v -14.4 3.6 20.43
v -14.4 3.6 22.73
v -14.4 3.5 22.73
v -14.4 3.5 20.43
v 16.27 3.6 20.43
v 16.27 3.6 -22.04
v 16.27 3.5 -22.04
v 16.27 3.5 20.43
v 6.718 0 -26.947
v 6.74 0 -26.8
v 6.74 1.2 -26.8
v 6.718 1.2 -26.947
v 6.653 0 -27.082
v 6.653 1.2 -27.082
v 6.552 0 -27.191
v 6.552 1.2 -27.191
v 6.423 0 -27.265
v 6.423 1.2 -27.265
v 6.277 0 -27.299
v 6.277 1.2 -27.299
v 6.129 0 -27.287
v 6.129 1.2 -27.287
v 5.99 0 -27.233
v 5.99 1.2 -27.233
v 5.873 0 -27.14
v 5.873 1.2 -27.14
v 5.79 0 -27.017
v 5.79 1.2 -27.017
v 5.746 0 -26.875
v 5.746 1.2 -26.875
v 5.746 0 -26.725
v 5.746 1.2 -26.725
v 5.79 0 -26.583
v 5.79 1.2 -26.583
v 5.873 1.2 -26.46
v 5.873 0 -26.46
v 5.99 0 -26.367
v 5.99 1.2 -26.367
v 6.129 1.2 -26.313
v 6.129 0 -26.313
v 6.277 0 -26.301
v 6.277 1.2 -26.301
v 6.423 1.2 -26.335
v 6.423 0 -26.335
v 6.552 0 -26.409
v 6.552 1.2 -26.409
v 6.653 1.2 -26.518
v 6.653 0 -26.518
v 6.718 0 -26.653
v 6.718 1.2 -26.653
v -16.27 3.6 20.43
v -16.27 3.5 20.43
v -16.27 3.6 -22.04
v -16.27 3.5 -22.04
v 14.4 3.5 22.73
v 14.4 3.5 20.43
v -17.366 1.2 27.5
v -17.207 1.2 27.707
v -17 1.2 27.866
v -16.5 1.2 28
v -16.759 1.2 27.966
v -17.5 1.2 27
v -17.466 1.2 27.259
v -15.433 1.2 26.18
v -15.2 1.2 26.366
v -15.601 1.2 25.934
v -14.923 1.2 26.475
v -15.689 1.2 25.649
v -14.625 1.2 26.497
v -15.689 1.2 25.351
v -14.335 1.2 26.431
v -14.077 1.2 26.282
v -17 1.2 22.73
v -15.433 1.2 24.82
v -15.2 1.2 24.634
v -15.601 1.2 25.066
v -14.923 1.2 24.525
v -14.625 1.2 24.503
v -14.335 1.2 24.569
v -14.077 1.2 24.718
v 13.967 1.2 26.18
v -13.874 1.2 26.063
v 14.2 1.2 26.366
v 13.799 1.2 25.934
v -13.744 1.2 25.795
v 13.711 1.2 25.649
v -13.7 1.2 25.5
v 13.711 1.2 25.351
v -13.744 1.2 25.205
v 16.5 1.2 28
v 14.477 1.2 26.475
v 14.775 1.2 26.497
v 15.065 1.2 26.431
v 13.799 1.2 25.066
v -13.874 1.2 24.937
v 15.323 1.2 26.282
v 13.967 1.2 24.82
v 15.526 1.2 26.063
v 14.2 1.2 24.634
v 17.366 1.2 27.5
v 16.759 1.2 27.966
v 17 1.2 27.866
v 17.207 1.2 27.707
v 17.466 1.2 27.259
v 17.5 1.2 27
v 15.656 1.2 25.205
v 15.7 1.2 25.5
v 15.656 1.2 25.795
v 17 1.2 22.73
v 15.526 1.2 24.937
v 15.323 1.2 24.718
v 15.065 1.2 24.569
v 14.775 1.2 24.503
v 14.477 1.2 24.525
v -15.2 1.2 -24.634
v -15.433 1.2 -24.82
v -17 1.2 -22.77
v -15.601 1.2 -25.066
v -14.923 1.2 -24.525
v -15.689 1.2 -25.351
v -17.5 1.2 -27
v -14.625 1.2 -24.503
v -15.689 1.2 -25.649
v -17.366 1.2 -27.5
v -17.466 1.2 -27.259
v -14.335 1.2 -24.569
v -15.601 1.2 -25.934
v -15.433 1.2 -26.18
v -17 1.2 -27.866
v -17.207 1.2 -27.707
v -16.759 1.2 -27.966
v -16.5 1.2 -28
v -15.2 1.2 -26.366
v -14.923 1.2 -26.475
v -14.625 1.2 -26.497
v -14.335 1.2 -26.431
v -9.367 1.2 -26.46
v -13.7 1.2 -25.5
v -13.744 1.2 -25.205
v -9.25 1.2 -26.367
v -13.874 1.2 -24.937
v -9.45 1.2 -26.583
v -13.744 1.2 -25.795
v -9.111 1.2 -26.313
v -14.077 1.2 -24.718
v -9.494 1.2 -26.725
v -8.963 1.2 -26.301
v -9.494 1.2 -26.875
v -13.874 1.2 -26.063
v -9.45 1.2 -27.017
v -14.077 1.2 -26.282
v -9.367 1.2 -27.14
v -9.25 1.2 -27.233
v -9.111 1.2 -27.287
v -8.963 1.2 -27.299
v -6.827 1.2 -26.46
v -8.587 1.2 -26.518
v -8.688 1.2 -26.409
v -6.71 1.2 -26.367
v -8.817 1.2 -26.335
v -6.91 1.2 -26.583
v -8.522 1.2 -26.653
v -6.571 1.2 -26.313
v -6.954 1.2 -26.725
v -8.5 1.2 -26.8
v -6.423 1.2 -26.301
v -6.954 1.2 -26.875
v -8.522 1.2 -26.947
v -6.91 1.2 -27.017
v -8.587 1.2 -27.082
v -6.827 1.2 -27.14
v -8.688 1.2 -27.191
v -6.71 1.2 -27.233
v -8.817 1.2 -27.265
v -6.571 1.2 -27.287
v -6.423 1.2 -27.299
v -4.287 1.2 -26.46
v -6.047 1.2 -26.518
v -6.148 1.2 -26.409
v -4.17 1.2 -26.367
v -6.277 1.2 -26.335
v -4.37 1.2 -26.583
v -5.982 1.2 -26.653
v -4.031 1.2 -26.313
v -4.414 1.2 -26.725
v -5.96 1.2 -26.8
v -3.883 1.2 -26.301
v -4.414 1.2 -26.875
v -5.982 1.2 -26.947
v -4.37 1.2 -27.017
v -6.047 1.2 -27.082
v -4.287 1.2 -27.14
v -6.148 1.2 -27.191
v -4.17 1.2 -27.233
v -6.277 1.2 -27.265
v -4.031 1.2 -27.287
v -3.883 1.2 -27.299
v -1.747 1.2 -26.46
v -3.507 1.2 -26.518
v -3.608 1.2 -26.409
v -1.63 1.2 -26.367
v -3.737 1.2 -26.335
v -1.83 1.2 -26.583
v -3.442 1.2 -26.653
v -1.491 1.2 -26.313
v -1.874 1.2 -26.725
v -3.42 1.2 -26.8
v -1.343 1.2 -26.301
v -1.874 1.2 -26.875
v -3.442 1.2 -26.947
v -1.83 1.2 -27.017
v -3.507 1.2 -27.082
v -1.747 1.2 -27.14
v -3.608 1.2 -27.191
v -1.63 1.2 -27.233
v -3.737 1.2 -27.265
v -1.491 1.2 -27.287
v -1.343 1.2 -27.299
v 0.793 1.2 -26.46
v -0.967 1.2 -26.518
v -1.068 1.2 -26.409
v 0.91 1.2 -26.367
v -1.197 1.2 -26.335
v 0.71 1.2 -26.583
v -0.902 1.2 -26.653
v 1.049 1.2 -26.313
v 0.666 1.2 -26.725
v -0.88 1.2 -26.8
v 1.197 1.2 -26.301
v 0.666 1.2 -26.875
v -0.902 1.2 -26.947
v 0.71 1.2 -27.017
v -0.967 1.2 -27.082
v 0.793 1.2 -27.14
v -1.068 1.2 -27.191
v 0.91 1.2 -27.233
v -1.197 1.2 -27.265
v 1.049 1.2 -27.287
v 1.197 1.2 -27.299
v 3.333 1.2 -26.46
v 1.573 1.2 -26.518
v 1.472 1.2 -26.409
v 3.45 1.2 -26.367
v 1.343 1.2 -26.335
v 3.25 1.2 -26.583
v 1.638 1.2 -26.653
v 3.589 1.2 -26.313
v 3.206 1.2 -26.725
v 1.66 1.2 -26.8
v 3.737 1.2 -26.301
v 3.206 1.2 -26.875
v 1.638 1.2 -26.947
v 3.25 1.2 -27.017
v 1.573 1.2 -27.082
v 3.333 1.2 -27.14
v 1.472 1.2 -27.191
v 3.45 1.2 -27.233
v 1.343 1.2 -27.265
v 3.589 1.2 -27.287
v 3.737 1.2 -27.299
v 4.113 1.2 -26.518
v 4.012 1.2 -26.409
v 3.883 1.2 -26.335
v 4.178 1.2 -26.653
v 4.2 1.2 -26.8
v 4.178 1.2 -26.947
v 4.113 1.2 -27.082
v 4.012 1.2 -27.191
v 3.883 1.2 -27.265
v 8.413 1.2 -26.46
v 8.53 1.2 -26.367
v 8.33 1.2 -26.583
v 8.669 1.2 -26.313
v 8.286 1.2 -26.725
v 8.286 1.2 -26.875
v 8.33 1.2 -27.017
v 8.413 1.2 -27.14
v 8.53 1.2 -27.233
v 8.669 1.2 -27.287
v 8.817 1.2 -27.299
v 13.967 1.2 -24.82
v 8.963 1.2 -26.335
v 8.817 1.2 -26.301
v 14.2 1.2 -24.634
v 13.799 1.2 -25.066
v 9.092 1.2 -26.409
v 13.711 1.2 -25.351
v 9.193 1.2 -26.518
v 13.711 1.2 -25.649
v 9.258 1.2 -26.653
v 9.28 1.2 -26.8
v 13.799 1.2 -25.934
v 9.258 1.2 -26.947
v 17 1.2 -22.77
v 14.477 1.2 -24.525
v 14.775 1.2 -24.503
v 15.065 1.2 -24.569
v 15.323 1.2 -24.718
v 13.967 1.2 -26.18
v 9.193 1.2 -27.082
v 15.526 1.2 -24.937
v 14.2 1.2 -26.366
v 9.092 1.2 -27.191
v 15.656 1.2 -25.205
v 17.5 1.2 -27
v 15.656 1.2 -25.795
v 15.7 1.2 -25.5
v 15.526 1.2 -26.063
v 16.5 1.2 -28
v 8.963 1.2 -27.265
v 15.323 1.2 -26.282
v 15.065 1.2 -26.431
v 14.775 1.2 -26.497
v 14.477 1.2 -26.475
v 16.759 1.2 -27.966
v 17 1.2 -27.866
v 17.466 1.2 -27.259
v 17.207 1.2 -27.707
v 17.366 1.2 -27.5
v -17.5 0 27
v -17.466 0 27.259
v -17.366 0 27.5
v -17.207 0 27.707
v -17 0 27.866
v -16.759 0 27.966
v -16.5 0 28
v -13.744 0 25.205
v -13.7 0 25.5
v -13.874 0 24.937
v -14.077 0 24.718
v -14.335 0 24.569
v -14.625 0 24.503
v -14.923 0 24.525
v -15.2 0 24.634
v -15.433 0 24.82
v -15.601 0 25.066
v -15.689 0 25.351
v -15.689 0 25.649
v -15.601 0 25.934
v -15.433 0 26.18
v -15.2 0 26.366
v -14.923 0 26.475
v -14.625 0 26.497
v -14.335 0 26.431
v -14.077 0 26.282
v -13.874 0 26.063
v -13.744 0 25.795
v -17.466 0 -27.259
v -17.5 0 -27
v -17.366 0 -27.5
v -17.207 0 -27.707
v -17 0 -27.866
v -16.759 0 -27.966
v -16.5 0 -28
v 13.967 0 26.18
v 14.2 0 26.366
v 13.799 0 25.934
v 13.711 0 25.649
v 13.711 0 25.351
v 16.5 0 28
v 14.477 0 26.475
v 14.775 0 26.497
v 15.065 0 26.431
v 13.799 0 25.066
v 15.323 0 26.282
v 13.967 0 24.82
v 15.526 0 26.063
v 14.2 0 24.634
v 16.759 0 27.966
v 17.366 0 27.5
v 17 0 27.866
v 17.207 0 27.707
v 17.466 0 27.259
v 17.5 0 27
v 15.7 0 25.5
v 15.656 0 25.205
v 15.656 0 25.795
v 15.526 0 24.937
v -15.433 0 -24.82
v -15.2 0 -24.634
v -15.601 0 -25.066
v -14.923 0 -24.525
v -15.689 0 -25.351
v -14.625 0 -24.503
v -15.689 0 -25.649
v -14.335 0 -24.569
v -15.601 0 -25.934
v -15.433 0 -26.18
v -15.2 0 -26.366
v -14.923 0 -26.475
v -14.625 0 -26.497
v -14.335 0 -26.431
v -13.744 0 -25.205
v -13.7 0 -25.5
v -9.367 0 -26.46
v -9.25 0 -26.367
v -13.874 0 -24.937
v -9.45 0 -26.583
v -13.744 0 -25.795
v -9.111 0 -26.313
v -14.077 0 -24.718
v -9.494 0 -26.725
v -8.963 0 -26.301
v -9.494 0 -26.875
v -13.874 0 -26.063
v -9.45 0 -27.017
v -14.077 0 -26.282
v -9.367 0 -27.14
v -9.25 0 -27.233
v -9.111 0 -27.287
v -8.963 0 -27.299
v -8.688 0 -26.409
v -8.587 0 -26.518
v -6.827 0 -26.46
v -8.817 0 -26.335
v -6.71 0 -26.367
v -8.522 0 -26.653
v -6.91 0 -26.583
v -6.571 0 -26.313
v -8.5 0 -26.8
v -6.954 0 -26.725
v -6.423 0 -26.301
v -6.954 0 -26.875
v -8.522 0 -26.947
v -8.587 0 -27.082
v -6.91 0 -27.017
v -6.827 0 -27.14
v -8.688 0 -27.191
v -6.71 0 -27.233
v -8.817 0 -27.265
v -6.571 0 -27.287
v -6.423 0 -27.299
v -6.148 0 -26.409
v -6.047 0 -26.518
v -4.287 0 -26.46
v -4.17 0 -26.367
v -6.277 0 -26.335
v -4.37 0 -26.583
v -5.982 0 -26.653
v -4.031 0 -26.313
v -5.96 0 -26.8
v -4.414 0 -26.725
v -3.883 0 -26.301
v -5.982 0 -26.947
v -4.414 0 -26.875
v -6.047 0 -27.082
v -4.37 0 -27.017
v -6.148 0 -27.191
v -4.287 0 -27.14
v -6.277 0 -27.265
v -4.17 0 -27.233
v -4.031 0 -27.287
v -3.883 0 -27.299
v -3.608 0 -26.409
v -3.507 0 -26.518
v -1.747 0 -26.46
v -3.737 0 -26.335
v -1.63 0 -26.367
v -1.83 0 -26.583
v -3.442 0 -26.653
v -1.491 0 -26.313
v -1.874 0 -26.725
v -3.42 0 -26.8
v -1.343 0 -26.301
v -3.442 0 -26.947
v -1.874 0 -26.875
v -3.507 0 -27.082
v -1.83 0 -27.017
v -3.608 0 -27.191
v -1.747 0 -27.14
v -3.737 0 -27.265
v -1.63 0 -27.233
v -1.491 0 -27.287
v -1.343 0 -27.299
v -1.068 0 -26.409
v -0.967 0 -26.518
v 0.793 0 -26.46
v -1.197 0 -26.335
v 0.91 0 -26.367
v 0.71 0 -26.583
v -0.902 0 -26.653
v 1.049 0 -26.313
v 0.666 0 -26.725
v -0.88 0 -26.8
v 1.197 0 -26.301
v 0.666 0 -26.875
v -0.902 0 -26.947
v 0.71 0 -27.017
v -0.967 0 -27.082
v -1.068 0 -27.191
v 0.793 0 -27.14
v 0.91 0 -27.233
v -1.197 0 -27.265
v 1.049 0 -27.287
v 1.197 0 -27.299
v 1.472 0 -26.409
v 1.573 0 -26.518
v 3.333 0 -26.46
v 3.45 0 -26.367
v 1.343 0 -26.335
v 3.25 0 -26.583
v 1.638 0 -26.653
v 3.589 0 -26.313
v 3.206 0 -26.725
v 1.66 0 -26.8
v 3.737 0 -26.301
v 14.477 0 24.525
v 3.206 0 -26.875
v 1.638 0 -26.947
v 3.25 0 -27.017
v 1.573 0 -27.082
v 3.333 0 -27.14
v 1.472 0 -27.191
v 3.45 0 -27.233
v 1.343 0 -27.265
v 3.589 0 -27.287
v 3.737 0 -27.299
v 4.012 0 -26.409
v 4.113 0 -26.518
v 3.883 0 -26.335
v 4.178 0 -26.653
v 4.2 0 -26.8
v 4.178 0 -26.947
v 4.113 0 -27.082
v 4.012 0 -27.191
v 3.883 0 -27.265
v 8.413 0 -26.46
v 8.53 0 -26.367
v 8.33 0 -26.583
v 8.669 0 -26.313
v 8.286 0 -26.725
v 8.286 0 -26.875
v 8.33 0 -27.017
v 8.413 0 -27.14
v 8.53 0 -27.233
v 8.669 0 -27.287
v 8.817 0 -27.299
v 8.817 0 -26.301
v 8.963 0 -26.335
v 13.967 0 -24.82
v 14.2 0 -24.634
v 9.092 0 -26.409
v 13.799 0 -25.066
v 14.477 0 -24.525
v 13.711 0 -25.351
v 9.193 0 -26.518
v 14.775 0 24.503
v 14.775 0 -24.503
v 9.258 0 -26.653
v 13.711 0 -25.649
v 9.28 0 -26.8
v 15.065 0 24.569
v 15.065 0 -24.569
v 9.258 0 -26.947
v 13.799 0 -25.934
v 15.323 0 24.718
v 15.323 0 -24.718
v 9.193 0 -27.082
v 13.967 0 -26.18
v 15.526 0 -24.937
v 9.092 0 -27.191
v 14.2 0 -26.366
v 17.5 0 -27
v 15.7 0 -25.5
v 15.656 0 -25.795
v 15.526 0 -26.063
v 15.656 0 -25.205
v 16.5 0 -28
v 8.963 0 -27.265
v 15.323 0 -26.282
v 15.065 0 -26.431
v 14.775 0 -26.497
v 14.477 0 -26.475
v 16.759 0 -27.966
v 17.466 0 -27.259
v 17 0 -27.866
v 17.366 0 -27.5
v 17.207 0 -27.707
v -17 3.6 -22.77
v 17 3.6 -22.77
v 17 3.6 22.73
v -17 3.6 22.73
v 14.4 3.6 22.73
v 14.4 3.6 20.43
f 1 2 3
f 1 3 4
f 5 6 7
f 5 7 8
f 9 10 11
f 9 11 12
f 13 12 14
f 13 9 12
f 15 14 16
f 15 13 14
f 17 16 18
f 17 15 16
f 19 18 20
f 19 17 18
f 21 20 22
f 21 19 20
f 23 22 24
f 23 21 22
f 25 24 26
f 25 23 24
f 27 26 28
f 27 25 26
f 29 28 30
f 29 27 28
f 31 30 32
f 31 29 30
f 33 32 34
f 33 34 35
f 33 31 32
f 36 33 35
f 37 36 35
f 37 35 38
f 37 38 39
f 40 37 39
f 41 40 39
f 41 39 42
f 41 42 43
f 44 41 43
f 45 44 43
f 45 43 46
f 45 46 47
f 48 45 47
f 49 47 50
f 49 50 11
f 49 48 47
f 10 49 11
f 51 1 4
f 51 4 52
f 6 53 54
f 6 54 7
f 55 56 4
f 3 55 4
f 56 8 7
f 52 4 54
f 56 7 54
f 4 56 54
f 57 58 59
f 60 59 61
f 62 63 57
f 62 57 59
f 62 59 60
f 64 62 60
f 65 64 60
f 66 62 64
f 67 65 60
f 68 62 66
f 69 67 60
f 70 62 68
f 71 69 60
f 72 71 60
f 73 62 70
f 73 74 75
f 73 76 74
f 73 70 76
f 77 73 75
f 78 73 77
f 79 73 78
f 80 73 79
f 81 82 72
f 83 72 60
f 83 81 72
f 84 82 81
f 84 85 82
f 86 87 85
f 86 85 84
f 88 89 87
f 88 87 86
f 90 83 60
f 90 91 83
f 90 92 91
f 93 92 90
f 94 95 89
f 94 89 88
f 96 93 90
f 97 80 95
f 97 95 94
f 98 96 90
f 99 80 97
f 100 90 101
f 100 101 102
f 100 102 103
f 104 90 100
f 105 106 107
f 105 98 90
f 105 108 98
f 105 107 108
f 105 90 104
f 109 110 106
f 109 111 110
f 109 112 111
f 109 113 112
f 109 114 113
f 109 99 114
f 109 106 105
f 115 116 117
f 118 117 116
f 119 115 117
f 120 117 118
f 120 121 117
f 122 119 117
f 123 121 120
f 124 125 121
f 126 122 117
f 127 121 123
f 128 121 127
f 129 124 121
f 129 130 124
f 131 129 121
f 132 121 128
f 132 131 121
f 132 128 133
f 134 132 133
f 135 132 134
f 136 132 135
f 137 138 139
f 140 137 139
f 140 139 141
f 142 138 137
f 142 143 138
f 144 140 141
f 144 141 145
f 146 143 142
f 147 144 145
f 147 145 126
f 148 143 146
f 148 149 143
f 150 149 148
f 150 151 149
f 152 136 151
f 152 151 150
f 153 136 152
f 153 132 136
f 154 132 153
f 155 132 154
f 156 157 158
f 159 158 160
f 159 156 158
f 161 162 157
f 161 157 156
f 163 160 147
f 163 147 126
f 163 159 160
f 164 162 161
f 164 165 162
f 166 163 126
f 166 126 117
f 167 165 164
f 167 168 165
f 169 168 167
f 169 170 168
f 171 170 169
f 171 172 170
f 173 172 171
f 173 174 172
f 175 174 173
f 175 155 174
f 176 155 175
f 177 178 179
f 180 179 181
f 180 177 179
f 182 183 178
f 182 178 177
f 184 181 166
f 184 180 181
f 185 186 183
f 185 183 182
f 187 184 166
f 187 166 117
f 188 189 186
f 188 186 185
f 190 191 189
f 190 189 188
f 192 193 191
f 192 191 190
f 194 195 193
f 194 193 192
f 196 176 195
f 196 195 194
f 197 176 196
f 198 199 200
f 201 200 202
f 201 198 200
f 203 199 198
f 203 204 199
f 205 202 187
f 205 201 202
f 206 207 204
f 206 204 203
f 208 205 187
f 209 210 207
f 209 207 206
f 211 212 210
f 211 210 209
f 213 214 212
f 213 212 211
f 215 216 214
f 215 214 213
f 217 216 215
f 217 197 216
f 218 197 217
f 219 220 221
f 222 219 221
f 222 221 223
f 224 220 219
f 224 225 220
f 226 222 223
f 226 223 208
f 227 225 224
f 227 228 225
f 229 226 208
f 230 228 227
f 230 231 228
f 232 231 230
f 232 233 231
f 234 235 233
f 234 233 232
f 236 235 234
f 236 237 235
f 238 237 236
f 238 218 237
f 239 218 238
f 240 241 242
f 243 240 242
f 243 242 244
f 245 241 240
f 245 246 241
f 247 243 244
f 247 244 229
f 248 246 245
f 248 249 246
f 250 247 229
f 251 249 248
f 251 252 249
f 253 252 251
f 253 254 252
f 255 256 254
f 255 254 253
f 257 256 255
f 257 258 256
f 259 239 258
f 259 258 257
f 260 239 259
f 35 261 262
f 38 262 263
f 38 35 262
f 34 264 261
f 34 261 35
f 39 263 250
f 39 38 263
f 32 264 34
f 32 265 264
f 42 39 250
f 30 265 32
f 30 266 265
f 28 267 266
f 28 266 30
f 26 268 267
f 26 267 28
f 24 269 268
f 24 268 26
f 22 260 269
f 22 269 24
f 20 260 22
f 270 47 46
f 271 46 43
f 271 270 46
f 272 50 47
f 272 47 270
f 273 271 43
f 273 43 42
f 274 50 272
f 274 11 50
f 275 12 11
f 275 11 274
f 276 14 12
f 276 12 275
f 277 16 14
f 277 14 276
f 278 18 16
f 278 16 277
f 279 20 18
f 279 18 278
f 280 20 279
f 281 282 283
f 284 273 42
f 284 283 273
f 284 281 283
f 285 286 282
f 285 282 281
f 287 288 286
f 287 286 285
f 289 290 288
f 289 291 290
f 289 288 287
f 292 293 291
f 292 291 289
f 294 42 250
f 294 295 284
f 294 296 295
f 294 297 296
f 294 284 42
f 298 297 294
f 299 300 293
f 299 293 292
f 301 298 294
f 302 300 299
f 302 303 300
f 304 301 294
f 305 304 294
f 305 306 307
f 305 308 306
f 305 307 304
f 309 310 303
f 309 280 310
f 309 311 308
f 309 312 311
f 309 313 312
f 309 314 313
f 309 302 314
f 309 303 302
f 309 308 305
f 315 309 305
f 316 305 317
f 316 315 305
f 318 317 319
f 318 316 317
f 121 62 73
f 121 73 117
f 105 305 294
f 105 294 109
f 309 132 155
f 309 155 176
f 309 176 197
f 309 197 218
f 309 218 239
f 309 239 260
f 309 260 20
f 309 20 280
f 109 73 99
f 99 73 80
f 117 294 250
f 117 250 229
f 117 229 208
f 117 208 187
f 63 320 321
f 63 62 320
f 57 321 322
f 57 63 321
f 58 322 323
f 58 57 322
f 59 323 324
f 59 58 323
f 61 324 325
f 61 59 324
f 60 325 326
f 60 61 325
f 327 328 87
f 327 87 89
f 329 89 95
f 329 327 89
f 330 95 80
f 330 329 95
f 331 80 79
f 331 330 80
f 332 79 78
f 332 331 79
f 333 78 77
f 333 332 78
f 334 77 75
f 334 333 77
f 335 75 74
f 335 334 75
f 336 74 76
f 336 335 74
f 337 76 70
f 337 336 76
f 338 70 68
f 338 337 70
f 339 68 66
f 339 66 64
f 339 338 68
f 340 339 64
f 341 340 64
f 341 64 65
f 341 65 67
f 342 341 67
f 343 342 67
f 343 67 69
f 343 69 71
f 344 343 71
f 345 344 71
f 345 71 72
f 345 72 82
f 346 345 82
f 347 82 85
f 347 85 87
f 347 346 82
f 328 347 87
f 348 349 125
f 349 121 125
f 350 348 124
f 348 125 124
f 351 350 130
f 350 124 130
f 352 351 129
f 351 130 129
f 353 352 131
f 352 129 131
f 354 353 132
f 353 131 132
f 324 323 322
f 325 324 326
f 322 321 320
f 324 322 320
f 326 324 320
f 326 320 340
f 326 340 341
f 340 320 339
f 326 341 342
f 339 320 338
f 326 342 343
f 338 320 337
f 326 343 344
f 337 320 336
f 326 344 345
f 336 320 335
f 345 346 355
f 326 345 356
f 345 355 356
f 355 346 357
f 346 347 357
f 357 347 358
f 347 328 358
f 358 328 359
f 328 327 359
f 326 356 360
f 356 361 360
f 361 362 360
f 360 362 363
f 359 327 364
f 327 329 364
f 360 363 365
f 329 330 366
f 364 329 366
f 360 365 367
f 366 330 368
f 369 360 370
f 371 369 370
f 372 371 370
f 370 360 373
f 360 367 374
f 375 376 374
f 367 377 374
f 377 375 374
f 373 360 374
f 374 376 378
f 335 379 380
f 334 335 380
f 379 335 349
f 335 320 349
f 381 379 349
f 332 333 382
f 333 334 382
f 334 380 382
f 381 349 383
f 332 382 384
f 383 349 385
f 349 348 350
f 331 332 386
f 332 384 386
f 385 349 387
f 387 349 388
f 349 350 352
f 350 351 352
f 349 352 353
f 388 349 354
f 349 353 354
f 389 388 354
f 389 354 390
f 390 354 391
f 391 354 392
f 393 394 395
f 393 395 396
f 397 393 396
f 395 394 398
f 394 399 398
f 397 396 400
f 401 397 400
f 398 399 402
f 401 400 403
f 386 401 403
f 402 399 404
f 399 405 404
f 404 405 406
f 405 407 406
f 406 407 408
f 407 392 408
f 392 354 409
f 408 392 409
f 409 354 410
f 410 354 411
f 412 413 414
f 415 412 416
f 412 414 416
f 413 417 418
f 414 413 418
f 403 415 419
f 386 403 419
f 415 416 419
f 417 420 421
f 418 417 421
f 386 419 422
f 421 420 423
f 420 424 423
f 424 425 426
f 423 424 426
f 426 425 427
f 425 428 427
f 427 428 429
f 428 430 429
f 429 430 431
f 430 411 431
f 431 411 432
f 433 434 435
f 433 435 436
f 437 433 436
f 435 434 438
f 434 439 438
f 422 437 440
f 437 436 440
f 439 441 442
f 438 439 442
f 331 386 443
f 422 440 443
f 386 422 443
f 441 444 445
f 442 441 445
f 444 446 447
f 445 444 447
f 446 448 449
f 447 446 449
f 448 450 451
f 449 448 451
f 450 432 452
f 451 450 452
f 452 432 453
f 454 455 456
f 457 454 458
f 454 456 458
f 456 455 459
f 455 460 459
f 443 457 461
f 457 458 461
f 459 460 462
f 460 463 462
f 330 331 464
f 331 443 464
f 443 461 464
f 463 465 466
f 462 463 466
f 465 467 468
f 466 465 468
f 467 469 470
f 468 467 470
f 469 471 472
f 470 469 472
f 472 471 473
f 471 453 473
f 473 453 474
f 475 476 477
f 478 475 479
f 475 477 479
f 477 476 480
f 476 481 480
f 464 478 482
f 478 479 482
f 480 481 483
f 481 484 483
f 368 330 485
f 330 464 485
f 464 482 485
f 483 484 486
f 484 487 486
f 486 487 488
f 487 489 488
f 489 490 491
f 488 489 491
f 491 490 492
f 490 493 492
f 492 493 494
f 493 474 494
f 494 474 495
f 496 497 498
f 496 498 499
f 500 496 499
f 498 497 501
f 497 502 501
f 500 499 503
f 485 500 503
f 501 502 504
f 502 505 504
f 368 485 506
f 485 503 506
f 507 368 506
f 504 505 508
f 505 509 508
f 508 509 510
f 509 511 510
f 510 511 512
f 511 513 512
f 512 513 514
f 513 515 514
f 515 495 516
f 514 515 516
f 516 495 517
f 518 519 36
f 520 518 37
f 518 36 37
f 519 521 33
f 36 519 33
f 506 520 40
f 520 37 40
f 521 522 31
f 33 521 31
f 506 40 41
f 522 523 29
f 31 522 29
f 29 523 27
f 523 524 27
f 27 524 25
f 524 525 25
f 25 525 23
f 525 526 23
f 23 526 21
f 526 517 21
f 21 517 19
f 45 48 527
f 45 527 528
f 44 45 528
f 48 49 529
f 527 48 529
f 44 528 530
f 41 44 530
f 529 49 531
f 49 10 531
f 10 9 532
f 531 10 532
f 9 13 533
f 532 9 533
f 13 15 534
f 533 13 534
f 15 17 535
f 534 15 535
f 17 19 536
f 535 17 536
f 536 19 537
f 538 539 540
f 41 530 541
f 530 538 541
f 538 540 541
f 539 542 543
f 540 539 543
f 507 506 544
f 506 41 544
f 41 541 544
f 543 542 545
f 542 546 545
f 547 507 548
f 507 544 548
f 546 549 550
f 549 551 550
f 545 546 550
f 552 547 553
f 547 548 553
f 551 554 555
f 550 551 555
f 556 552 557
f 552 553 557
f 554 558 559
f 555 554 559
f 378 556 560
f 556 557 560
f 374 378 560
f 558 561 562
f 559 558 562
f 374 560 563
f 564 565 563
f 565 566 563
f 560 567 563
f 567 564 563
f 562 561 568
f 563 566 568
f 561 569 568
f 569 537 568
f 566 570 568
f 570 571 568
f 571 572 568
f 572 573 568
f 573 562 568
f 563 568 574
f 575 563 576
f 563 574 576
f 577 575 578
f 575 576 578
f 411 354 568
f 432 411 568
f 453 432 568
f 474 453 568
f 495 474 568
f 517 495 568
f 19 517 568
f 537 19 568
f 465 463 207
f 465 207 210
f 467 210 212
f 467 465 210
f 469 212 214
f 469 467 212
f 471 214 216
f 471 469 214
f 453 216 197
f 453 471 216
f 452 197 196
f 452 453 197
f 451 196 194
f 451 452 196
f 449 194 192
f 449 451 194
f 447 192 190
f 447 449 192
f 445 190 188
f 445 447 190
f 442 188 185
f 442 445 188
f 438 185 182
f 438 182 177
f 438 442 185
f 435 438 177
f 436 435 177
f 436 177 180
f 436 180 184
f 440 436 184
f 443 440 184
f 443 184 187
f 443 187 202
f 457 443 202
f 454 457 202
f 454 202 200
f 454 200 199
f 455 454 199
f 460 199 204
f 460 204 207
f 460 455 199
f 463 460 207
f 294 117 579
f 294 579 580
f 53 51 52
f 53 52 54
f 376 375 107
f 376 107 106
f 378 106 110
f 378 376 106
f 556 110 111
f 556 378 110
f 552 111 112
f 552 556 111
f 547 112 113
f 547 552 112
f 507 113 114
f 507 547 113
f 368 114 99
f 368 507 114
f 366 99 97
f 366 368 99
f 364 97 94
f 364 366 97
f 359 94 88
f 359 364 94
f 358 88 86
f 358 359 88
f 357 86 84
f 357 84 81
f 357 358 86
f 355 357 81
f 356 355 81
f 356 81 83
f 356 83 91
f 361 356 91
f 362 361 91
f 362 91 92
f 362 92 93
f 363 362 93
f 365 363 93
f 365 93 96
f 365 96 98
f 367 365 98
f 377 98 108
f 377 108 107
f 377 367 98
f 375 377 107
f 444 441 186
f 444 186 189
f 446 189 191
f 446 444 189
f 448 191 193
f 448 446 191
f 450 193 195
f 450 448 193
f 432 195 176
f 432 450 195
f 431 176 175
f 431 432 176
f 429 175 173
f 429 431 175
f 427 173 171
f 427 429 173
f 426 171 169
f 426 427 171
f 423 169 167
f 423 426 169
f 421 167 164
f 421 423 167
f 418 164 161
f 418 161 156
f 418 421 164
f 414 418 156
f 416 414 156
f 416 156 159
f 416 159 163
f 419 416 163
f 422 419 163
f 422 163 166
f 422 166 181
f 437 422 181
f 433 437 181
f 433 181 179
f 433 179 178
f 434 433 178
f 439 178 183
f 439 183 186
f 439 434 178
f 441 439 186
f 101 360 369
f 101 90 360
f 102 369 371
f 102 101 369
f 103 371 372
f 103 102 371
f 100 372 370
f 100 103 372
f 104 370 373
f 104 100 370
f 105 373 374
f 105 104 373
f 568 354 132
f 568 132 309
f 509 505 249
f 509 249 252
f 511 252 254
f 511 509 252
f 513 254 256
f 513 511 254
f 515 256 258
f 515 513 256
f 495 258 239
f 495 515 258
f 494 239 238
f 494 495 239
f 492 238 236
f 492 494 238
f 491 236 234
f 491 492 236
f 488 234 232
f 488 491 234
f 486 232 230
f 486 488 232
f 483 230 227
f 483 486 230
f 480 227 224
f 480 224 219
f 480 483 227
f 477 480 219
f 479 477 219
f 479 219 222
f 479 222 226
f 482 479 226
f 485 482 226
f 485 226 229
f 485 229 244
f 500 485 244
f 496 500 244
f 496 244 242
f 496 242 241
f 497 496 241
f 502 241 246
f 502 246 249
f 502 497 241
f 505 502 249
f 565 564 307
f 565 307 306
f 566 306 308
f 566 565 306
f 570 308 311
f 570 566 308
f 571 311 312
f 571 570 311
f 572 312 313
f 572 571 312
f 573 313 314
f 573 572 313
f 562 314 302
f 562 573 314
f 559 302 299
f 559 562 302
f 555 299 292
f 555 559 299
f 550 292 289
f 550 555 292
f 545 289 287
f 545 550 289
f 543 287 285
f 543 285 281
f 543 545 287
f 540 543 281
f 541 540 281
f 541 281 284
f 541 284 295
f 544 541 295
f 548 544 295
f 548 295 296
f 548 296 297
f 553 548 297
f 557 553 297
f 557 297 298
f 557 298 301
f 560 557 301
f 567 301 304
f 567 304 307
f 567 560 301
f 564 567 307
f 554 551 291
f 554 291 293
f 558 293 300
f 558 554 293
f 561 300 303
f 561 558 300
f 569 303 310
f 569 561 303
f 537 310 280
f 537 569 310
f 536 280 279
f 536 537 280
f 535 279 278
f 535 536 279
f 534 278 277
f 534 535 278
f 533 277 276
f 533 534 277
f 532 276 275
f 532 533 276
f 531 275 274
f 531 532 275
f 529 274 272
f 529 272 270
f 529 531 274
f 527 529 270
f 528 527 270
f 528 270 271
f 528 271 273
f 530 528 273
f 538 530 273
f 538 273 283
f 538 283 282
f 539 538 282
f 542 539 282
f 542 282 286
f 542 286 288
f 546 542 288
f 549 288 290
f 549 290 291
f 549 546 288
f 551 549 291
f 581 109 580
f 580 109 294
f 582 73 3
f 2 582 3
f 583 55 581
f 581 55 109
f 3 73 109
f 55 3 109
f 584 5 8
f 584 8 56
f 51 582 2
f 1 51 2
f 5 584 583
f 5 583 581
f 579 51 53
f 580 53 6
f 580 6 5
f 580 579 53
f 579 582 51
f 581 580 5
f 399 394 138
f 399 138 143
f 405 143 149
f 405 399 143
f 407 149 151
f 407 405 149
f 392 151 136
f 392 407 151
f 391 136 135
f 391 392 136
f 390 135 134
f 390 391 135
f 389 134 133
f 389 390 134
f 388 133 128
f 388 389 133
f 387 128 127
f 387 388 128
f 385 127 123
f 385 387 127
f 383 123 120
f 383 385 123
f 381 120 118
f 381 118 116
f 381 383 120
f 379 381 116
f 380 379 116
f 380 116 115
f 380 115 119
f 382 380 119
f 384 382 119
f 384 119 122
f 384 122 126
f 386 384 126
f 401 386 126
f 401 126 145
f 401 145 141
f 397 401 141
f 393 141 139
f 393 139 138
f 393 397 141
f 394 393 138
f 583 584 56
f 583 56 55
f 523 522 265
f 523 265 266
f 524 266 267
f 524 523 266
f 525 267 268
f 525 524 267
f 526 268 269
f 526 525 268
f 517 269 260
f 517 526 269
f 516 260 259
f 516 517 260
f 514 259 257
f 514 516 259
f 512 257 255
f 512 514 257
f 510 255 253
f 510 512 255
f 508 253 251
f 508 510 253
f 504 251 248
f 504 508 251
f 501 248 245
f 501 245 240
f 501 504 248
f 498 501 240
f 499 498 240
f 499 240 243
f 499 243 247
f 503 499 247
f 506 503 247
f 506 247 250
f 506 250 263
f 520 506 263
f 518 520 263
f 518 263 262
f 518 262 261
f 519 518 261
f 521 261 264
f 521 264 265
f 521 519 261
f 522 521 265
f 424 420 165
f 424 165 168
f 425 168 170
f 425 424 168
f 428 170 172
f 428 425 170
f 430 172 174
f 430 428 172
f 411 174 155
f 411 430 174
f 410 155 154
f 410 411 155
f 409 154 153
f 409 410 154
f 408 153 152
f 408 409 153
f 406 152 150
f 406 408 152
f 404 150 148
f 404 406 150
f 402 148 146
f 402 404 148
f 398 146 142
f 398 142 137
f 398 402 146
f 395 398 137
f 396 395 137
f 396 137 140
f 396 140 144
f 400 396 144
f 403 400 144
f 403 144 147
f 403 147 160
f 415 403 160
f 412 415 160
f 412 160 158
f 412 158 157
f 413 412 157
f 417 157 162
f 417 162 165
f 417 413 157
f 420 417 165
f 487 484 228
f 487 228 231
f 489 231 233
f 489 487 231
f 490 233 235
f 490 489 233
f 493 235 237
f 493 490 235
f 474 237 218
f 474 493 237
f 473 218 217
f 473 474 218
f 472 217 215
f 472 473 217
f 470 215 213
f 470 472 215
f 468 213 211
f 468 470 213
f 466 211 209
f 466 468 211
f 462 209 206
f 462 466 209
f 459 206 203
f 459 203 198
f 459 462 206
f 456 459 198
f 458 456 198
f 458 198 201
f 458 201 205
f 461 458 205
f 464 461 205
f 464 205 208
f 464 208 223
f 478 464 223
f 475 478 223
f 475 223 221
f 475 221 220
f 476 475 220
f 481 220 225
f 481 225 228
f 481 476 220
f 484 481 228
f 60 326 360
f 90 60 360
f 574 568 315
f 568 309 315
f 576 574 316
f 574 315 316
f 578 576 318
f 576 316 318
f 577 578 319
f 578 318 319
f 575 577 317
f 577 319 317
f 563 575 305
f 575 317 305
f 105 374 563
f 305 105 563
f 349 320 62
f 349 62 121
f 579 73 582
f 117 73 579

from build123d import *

# Parameters (mm, degrees)
SKETCH1_W           = 35
SKETCH1_H           = 56
SKETCH1_R           = 1
SKETCH1_R_2         = 0.5
BOSS_EXTRUDE1_DEPTH = 1.2
FILLET1_R           = 1
SKETCH2_W           = 34
SKETCH2_H           = 45.5
BOSS_EXTRUDE2_DEPTH = 2.4
CUT_EXTRUDE1_DEPTH  = 0.1


with BuildPart() as part:
    # Sketch1 → Boss-Extrude1 (new body)
    with BuildSketch(Plane(origin=(0, 0, 0), x_dir=(1, 0, 0), z_dir=(0, 1, 0))):
        Rectangle(SKETCH1_W, SKETCH1_H)
        with Locations((-14.7, 25.5)):
            Circle(SKETCH1_R, mode=Mode.SUBTRACT)
        with Locations((14.7, 25.5)):
            Circle(SKETCH1_R, mode=Mode.SUBTRACT)
        with Locations((-14.7, -25.5)):
            Circle(SKETCH1_R, mode=Mode.SUBTRACT)
        with Locations((14.7, -25.5)):
            Circle(SKETCH1_R, mode=Mode.SUBTRACT)
        with Locations((-9, 26.8)):
            Circle(SKETCH1_R_2, mode=Mode.SUBTRACT)
        with Locations((-6.46, 26.8)):
            Circle(SKETCH1_R_2, mode=Mode.SUBTRACT)
        with Locations((-3.92, 26.8)):
            Circle(SKETCH1_R_2, mode=Mode.SUBTRACT)
        with Locations((-1.38, 26.8)):
            Circle(SKETCH1_R_2, mode=Mode.SUBTRACT)
        with Locations((1.16, 26.8)):
            Circle(SKETCH1_R_2, mode=Mode.SUBTRACT)
        with Locations((3.7, 26.8)):
            Circle(SKETCH1_R_2, mode=Mode.SUBTRACT)
        with Locations((6.24, 26.8)):
            Circle(SKETCH1_R_2, mode=Mode.SUBTRACT)
        with Locations((8.78, 26.8)):
            Circle(SKETCH1_R_2, mode=Mode.SUBTRACT)
    extrude(amount=BOSS_EXTRUDE1_DEPTH)

    # Fillet1
    fillet1_edges = [part.edges().sort_by_distance(p)[0] for p in [
        (17.5, 0.6, 28),
        (-17.5, 0.6, 28),
        (-17.5, 0.6, -28),
        (17.5, 0.6, -28),
    ]]
    fillet(fillet1_edges, radius=FILLET1_R)

    # Sketch2 → Boss-Extrude2 (add)
    with BuildSketch(Plane(origin=(0, 1.2, 0), x_dir=(1, 0, 0), z_dir=(0, 1, 0))):
        with Locations((0, 0.02)):
            Rectangle(SKETCH2_W, SKETCH2_H)
    extrude(amount=BOSS_EXTRUDE2_DEPTH)

    # Sketch3 → Cut-Extrude1 (cut)
    with BuildSketch(Plane(origin=(0, 3.6, 0), x_dir=(1, 0, 0), z_dir=(0, 1, 0))):
        Polygon((-16.27, 22.04), (16.27, 22.04), (16.27, -20.43), (14.4, -20.43), (14.4, -22.73), (-14.4, -22.73), (-14.4, -20.43), (-16.27, -20.43), align=None)
    extrude(amount=-CUT_EXTRUDE1_DEPTH, mode=Mode.SUBTRACT)


solid = part.part
